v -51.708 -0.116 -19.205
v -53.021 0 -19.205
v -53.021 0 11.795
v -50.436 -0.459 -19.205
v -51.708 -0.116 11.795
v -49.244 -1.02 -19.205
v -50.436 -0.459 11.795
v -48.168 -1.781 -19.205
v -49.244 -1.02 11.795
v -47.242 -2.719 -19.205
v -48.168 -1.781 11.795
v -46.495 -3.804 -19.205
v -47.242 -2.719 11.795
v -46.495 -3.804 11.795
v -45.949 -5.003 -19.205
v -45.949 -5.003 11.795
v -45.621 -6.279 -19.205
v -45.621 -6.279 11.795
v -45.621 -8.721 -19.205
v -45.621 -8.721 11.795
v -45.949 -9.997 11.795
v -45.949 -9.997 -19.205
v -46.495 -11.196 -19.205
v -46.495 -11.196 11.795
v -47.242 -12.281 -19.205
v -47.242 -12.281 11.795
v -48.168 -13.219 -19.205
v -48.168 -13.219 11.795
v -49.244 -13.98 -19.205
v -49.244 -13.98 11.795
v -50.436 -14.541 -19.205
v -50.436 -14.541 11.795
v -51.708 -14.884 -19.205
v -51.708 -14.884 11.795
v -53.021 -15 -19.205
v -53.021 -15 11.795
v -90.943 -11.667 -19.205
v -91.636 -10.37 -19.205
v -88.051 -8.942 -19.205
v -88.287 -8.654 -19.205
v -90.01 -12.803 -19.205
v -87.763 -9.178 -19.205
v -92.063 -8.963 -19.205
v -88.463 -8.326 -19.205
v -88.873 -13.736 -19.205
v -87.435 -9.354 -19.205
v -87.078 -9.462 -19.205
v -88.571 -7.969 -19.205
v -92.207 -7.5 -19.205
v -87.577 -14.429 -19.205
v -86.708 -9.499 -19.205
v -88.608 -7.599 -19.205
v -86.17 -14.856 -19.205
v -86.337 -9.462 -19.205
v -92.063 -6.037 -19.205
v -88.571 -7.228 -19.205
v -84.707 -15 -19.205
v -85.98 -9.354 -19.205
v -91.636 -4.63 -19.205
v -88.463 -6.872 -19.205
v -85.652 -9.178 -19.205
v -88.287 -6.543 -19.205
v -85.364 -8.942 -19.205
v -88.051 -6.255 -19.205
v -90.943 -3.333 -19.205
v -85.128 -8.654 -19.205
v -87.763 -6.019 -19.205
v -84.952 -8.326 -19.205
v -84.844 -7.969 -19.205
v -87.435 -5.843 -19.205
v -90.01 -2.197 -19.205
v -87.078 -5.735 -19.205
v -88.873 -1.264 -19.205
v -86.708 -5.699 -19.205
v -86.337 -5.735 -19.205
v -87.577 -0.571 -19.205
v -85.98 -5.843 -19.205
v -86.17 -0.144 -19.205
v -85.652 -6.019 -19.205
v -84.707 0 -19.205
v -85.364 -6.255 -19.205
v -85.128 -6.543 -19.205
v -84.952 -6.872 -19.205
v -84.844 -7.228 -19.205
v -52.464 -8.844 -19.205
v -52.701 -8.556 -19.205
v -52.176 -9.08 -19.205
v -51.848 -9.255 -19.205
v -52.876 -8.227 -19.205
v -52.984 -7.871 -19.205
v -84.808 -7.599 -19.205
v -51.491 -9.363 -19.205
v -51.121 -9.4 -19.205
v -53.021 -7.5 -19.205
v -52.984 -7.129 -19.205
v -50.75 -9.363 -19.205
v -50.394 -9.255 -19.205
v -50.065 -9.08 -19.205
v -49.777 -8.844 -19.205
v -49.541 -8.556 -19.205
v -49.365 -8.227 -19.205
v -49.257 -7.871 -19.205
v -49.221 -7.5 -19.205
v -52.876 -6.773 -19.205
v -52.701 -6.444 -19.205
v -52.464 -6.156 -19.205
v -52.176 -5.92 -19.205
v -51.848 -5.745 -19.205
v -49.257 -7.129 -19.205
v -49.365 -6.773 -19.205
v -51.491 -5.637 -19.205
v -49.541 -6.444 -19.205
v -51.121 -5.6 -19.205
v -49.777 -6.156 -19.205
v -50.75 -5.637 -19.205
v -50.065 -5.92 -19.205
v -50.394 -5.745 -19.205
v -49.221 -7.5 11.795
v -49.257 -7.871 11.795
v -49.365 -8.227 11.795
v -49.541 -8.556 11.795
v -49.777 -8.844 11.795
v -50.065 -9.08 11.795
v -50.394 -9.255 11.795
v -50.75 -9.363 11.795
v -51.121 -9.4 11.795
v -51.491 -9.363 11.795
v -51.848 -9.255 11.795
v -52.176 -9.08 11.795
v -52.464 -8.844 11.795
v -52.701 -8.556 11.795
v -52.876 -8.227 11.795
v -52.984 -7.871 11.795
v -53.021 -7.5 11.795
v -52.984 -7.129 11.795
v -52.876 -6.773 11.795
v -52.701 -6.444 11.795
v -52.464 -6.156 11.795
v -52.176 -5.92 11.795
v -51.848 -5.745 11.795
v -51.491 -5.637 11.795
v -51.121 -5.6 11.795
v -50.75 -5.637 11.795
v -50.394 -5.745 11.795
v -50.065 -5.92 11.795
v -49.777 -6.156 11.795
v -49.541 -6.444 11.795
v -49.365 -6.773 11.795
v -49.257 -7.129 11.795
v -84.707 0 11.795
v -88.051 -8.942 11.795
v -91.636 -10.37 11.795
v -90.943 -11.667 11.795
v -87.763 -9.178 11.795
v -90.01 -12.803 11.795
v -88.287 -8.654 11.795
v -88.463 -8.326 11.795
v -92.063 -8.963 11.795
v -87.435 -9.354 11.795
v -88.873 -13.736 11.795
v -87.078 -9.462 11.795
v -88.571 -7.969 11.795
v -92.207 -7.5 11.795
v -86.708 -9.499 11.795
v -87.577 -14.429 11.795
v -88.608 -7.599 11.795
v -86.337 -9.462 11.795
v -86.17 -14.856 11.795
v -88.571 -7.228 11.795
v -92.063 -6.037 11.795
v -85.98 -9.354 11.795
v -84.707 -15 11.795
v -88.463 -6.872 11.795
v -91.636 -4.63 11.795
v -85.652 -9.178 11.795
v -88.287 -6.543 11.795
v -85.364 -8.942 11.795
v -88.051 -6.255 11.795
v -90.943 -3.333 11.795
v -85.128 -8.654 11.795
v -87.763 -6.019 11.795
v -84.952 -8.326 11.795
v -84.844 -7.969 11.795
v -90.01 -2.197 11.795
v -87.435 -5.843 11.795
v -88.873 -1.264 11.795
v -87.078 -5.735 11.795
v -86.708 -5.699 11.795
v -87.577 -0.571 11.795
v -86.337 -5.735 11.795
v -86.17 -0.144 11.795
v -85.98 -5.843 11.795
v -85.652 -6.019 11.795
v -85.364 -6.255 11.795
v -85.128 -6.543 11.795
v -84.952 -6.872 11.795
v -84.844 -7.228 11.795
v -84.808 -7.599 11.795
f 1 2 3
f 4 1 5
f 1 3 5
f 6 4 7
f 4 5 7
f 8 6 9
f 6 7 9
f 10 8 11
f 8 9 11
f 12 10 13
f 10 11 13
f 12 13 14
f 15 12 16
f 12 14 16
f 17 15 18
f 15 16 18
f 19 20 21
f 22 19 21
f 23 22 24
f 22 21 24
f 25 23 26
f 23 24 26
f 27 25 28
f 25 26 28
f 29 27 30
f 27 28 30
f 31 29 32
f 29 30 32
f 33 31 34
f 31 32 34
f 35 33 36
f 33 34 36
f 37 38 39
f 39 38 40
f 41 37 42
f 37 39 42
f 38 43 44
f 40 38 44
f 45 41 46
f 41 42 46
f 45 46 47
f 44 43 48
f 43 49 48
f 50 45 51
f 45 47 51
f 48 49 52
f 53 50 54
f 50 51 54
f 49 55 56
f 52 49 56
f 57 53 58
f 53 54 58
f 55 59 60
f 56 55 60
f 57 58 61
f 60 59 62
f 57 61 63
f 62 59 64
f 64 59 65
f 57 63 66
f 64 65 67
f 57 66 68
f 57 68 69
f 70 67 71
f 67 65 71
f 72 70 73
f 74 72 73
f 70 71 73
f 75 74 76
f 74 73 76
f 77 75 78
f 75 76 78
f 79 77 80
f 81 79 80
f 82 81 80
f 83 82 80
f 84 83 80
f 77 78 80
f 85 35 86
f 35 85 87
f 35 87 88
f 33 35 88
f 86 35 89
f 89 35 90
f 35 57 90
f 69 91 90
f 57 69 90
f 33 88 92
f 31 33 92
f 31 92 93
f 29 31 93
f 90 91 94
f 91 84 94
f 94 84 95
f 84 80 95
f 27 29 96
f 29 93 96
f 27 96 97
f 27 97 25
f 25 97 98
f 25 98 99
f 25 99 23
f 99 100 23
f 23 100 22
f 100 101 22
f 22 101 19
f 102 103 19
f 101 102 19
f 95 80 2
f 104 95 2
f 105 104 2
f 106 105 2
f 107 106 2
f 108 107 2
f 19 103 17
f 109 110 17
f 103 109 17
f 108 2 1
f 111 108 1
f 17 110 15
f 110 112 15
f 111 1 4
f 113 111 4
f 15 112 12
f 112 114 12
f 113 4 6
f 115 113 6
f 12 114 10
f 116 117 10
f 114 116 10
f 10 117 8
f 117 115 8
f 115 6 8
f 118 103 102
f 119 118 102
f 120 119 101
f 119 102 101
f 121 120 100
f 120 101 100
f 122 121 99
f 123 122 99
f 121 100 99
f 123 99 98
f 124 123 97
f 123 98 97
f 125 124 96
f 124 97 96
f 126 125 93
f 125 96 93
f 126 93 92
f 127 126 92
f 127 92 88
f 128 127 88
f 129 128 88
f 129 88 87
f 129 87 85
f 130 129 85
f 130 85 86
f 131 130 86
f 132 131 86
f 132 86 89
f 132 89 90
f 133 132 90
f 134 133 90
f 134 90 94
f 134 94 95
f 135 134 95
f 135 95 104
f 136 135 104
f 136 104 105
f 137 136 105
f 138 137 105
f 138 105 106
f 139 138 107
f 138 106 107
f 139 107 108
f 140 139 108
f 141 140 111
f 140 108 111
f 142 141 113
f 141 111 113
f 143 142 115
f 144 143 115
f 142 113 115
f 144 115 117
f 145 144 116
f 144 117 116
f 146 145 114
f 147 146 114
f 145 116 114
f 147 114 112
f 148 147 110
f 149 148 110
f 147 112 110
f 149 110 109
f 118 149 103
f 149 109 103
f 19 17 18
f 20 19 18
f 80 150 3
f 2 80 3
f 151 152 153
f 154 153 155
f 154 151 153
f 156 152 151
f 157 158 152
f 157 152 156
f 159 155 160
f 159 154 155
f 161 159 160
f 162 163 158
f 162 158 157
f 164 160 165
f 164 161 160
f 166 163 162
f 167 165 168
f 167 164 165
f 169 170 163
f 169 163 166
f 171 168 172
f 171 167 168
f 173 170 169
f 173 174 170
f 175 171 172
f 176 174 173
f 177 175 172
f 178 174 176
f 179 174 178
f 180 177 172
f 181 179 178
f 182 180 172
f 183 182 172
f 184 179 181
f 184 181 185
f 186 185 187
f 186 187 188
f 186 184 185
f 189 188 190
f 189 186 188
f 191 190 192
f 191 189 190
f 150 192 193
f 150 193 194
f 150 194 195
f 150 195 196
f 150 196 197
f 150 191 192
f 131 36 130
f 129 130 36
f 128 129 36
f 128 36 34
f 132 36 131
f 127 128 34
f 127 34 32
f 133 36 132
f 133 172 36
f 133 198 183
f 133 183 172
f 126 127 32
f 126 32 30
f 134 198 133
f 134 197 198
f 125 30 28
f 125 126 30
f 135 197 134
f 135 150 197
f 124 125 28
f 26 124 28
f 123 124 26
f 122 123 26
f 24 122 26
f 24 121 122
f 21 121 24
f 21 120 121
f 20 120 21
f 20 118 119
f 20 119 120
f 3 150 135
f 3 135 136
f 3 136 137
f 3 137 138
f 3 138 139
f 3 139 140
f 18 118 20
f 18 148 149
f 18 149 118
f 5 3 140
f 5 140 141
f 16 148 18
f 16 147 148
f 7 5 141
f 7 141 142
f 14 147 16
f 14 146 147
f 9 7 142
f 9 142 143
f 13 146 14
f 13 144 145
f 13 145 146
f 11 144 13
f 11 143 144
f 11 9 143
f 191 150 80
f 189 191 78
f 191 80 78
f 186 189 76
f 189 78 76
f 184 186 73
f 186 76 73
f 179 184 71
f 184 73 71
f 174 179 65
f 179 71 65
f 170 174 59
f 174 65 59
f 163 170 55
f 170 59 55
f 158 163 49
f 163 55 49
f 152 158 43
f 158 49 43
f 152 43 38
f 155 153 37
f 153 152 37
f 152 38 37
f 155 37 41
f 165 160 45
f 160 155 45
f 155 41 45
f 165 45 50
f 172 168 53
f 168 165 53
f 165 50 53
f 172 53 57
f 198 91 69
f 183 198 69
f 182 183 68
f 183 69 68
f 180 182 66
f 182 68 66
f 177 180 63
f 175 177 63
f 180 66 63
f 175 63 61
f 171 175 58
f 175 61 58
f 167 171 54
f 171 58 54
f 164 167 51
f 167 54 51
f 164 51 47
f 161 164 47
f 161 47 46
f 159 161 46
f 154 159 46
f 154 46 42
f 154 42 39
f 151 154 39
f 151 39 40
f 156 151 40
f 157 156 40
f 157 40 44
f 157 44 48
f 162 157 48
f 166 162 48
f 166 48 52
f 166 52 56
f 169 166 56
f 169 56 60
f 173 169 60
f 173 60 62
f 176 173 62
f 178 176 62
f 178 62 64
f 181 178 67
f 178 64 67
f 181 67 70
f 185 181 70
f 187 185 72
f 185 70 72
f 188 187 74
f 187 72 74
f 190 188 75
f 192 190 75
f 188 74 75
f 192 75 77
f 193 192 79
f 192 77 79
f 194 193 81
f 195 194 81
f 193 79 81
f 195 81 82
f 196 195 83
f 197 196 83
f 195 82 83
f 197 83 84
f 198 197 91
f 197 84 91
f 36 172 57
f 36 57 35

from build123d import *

# Parameters (mm, degrees)
F0_W      = 47
F0_H      = 31
F1_DEPTH  = 15
F2_R      = 1.9
F3_DEPTH  = 60
F5_DEPTH  = 70
F6_R      = 1.9
F7_DEPTH  = 80
F9_DEPTH  = 70
F11_DEPTH = 70


with BuildPart() as f1:
    # F0 (on Front) → F1 (new body)
    with BuildSketch(Plane.XZ):
        with Locations((-69.120786, -3.705296)):
            Rectangle(F0_W, F0_H)
    extrude(amount=F1_DEPTH)

    # F2 (on face) → F3 (cut)
    with BuildSketch(Plane(origin=(0, 0, -19.205296), x_dir=(1, 0, 0), z_dir=(0, 0, -1))):
        with Locations((-51.120786, 7.5)):
            Circle(F2_R)
    extrude(amount=-F3_DEPTH, mode=Mode.SUBTRACT)

    # F4 (on face) → F5 (cut)
    with BuildSketch(Plane(origin=(0, 0, -19.205296), x_dir=(1, 0, 0), z_dir=(0, 0, -1))):
        with BuildLine():
            ThreePointArc((-84.706673, 0), (-92.206673, 7.5), (-84.706673, 15))
            Line((-84.706673, 15), (-92.620786, 15))
            Line((-92.620786, 15), (-92.620786, 0))
            Line((-92.620786, 0), (-84.706673, 0))
        make_face()
    extrude(amount=-F5_DEPTH, mode=Mode.SUBTRACT)

    # F6 (on face) → F7 (cut)
    with BuildSketch(Plane(origin=(0, 0, -19.205296), x_dir=(1, 0, 0), z_dir=(0, 0, -1))):
        with Locations((-86.707558, 7.5987)):
            Circle(F6_R)
    extrude(amount=-F7_DEPTH, mode=Mode.SUBTRACT)

    # F8 (on face) → F9 (cut)
    with BuildSketch(Plane(origin=(0, 0, -19.205296), x_dir=(1, 0, 0), z_dir=(0, 0, -1))):
        with BuildLine():
            Line((-45.620786, 0), (19.677406, 0))
            ThreePointArc((19.677406, 0), (27.177406, 7.5), (19.677406, 15))
            Line((19.677406, 15), (-45.620786, 15))
            Line((-45.620786, 15), (-45.620786, 0))
        make_face()
    extrude(amount=-F9_DEPTH, mode=Mode.SUBTRACT)

    # F10 (on face) → F11 (cut)
    with BuildSketch(Plane.XY.offset(11.794704)):
        with BuildLine():
            ThreePointArc((-53.020786, 0), (-48.168205, -1.781394), (-45.620786, -6.279344))
            Line((-45.620786, -6.279344), (-45.620786, 0))
            Line((-45.620786, 0), (-53.020786, 0))
        make_face()
        with BuildLine():
            Line((-45.620786, -6.279344), (-45.620786, -8.720656))
            ThreePointArc((-45.620786, -8.720656), (-45.520786, -7.5), (-45.620786, -6.279344))
        make_face()
        with BuildLine():
            ThreePointArc((-45.620786, -8.720656), (-48.168205, -13.218606), (-53.020786, -15))
            Line((-53.020786, -15), (-45.620786, -15))
            Line((-45.620786, -15), (-45.620786, -8.720656))
        make_face()
    extrude(amount=-F11_DEPTH, mode=Mode.SUBTRACT)


solid = f1.part
